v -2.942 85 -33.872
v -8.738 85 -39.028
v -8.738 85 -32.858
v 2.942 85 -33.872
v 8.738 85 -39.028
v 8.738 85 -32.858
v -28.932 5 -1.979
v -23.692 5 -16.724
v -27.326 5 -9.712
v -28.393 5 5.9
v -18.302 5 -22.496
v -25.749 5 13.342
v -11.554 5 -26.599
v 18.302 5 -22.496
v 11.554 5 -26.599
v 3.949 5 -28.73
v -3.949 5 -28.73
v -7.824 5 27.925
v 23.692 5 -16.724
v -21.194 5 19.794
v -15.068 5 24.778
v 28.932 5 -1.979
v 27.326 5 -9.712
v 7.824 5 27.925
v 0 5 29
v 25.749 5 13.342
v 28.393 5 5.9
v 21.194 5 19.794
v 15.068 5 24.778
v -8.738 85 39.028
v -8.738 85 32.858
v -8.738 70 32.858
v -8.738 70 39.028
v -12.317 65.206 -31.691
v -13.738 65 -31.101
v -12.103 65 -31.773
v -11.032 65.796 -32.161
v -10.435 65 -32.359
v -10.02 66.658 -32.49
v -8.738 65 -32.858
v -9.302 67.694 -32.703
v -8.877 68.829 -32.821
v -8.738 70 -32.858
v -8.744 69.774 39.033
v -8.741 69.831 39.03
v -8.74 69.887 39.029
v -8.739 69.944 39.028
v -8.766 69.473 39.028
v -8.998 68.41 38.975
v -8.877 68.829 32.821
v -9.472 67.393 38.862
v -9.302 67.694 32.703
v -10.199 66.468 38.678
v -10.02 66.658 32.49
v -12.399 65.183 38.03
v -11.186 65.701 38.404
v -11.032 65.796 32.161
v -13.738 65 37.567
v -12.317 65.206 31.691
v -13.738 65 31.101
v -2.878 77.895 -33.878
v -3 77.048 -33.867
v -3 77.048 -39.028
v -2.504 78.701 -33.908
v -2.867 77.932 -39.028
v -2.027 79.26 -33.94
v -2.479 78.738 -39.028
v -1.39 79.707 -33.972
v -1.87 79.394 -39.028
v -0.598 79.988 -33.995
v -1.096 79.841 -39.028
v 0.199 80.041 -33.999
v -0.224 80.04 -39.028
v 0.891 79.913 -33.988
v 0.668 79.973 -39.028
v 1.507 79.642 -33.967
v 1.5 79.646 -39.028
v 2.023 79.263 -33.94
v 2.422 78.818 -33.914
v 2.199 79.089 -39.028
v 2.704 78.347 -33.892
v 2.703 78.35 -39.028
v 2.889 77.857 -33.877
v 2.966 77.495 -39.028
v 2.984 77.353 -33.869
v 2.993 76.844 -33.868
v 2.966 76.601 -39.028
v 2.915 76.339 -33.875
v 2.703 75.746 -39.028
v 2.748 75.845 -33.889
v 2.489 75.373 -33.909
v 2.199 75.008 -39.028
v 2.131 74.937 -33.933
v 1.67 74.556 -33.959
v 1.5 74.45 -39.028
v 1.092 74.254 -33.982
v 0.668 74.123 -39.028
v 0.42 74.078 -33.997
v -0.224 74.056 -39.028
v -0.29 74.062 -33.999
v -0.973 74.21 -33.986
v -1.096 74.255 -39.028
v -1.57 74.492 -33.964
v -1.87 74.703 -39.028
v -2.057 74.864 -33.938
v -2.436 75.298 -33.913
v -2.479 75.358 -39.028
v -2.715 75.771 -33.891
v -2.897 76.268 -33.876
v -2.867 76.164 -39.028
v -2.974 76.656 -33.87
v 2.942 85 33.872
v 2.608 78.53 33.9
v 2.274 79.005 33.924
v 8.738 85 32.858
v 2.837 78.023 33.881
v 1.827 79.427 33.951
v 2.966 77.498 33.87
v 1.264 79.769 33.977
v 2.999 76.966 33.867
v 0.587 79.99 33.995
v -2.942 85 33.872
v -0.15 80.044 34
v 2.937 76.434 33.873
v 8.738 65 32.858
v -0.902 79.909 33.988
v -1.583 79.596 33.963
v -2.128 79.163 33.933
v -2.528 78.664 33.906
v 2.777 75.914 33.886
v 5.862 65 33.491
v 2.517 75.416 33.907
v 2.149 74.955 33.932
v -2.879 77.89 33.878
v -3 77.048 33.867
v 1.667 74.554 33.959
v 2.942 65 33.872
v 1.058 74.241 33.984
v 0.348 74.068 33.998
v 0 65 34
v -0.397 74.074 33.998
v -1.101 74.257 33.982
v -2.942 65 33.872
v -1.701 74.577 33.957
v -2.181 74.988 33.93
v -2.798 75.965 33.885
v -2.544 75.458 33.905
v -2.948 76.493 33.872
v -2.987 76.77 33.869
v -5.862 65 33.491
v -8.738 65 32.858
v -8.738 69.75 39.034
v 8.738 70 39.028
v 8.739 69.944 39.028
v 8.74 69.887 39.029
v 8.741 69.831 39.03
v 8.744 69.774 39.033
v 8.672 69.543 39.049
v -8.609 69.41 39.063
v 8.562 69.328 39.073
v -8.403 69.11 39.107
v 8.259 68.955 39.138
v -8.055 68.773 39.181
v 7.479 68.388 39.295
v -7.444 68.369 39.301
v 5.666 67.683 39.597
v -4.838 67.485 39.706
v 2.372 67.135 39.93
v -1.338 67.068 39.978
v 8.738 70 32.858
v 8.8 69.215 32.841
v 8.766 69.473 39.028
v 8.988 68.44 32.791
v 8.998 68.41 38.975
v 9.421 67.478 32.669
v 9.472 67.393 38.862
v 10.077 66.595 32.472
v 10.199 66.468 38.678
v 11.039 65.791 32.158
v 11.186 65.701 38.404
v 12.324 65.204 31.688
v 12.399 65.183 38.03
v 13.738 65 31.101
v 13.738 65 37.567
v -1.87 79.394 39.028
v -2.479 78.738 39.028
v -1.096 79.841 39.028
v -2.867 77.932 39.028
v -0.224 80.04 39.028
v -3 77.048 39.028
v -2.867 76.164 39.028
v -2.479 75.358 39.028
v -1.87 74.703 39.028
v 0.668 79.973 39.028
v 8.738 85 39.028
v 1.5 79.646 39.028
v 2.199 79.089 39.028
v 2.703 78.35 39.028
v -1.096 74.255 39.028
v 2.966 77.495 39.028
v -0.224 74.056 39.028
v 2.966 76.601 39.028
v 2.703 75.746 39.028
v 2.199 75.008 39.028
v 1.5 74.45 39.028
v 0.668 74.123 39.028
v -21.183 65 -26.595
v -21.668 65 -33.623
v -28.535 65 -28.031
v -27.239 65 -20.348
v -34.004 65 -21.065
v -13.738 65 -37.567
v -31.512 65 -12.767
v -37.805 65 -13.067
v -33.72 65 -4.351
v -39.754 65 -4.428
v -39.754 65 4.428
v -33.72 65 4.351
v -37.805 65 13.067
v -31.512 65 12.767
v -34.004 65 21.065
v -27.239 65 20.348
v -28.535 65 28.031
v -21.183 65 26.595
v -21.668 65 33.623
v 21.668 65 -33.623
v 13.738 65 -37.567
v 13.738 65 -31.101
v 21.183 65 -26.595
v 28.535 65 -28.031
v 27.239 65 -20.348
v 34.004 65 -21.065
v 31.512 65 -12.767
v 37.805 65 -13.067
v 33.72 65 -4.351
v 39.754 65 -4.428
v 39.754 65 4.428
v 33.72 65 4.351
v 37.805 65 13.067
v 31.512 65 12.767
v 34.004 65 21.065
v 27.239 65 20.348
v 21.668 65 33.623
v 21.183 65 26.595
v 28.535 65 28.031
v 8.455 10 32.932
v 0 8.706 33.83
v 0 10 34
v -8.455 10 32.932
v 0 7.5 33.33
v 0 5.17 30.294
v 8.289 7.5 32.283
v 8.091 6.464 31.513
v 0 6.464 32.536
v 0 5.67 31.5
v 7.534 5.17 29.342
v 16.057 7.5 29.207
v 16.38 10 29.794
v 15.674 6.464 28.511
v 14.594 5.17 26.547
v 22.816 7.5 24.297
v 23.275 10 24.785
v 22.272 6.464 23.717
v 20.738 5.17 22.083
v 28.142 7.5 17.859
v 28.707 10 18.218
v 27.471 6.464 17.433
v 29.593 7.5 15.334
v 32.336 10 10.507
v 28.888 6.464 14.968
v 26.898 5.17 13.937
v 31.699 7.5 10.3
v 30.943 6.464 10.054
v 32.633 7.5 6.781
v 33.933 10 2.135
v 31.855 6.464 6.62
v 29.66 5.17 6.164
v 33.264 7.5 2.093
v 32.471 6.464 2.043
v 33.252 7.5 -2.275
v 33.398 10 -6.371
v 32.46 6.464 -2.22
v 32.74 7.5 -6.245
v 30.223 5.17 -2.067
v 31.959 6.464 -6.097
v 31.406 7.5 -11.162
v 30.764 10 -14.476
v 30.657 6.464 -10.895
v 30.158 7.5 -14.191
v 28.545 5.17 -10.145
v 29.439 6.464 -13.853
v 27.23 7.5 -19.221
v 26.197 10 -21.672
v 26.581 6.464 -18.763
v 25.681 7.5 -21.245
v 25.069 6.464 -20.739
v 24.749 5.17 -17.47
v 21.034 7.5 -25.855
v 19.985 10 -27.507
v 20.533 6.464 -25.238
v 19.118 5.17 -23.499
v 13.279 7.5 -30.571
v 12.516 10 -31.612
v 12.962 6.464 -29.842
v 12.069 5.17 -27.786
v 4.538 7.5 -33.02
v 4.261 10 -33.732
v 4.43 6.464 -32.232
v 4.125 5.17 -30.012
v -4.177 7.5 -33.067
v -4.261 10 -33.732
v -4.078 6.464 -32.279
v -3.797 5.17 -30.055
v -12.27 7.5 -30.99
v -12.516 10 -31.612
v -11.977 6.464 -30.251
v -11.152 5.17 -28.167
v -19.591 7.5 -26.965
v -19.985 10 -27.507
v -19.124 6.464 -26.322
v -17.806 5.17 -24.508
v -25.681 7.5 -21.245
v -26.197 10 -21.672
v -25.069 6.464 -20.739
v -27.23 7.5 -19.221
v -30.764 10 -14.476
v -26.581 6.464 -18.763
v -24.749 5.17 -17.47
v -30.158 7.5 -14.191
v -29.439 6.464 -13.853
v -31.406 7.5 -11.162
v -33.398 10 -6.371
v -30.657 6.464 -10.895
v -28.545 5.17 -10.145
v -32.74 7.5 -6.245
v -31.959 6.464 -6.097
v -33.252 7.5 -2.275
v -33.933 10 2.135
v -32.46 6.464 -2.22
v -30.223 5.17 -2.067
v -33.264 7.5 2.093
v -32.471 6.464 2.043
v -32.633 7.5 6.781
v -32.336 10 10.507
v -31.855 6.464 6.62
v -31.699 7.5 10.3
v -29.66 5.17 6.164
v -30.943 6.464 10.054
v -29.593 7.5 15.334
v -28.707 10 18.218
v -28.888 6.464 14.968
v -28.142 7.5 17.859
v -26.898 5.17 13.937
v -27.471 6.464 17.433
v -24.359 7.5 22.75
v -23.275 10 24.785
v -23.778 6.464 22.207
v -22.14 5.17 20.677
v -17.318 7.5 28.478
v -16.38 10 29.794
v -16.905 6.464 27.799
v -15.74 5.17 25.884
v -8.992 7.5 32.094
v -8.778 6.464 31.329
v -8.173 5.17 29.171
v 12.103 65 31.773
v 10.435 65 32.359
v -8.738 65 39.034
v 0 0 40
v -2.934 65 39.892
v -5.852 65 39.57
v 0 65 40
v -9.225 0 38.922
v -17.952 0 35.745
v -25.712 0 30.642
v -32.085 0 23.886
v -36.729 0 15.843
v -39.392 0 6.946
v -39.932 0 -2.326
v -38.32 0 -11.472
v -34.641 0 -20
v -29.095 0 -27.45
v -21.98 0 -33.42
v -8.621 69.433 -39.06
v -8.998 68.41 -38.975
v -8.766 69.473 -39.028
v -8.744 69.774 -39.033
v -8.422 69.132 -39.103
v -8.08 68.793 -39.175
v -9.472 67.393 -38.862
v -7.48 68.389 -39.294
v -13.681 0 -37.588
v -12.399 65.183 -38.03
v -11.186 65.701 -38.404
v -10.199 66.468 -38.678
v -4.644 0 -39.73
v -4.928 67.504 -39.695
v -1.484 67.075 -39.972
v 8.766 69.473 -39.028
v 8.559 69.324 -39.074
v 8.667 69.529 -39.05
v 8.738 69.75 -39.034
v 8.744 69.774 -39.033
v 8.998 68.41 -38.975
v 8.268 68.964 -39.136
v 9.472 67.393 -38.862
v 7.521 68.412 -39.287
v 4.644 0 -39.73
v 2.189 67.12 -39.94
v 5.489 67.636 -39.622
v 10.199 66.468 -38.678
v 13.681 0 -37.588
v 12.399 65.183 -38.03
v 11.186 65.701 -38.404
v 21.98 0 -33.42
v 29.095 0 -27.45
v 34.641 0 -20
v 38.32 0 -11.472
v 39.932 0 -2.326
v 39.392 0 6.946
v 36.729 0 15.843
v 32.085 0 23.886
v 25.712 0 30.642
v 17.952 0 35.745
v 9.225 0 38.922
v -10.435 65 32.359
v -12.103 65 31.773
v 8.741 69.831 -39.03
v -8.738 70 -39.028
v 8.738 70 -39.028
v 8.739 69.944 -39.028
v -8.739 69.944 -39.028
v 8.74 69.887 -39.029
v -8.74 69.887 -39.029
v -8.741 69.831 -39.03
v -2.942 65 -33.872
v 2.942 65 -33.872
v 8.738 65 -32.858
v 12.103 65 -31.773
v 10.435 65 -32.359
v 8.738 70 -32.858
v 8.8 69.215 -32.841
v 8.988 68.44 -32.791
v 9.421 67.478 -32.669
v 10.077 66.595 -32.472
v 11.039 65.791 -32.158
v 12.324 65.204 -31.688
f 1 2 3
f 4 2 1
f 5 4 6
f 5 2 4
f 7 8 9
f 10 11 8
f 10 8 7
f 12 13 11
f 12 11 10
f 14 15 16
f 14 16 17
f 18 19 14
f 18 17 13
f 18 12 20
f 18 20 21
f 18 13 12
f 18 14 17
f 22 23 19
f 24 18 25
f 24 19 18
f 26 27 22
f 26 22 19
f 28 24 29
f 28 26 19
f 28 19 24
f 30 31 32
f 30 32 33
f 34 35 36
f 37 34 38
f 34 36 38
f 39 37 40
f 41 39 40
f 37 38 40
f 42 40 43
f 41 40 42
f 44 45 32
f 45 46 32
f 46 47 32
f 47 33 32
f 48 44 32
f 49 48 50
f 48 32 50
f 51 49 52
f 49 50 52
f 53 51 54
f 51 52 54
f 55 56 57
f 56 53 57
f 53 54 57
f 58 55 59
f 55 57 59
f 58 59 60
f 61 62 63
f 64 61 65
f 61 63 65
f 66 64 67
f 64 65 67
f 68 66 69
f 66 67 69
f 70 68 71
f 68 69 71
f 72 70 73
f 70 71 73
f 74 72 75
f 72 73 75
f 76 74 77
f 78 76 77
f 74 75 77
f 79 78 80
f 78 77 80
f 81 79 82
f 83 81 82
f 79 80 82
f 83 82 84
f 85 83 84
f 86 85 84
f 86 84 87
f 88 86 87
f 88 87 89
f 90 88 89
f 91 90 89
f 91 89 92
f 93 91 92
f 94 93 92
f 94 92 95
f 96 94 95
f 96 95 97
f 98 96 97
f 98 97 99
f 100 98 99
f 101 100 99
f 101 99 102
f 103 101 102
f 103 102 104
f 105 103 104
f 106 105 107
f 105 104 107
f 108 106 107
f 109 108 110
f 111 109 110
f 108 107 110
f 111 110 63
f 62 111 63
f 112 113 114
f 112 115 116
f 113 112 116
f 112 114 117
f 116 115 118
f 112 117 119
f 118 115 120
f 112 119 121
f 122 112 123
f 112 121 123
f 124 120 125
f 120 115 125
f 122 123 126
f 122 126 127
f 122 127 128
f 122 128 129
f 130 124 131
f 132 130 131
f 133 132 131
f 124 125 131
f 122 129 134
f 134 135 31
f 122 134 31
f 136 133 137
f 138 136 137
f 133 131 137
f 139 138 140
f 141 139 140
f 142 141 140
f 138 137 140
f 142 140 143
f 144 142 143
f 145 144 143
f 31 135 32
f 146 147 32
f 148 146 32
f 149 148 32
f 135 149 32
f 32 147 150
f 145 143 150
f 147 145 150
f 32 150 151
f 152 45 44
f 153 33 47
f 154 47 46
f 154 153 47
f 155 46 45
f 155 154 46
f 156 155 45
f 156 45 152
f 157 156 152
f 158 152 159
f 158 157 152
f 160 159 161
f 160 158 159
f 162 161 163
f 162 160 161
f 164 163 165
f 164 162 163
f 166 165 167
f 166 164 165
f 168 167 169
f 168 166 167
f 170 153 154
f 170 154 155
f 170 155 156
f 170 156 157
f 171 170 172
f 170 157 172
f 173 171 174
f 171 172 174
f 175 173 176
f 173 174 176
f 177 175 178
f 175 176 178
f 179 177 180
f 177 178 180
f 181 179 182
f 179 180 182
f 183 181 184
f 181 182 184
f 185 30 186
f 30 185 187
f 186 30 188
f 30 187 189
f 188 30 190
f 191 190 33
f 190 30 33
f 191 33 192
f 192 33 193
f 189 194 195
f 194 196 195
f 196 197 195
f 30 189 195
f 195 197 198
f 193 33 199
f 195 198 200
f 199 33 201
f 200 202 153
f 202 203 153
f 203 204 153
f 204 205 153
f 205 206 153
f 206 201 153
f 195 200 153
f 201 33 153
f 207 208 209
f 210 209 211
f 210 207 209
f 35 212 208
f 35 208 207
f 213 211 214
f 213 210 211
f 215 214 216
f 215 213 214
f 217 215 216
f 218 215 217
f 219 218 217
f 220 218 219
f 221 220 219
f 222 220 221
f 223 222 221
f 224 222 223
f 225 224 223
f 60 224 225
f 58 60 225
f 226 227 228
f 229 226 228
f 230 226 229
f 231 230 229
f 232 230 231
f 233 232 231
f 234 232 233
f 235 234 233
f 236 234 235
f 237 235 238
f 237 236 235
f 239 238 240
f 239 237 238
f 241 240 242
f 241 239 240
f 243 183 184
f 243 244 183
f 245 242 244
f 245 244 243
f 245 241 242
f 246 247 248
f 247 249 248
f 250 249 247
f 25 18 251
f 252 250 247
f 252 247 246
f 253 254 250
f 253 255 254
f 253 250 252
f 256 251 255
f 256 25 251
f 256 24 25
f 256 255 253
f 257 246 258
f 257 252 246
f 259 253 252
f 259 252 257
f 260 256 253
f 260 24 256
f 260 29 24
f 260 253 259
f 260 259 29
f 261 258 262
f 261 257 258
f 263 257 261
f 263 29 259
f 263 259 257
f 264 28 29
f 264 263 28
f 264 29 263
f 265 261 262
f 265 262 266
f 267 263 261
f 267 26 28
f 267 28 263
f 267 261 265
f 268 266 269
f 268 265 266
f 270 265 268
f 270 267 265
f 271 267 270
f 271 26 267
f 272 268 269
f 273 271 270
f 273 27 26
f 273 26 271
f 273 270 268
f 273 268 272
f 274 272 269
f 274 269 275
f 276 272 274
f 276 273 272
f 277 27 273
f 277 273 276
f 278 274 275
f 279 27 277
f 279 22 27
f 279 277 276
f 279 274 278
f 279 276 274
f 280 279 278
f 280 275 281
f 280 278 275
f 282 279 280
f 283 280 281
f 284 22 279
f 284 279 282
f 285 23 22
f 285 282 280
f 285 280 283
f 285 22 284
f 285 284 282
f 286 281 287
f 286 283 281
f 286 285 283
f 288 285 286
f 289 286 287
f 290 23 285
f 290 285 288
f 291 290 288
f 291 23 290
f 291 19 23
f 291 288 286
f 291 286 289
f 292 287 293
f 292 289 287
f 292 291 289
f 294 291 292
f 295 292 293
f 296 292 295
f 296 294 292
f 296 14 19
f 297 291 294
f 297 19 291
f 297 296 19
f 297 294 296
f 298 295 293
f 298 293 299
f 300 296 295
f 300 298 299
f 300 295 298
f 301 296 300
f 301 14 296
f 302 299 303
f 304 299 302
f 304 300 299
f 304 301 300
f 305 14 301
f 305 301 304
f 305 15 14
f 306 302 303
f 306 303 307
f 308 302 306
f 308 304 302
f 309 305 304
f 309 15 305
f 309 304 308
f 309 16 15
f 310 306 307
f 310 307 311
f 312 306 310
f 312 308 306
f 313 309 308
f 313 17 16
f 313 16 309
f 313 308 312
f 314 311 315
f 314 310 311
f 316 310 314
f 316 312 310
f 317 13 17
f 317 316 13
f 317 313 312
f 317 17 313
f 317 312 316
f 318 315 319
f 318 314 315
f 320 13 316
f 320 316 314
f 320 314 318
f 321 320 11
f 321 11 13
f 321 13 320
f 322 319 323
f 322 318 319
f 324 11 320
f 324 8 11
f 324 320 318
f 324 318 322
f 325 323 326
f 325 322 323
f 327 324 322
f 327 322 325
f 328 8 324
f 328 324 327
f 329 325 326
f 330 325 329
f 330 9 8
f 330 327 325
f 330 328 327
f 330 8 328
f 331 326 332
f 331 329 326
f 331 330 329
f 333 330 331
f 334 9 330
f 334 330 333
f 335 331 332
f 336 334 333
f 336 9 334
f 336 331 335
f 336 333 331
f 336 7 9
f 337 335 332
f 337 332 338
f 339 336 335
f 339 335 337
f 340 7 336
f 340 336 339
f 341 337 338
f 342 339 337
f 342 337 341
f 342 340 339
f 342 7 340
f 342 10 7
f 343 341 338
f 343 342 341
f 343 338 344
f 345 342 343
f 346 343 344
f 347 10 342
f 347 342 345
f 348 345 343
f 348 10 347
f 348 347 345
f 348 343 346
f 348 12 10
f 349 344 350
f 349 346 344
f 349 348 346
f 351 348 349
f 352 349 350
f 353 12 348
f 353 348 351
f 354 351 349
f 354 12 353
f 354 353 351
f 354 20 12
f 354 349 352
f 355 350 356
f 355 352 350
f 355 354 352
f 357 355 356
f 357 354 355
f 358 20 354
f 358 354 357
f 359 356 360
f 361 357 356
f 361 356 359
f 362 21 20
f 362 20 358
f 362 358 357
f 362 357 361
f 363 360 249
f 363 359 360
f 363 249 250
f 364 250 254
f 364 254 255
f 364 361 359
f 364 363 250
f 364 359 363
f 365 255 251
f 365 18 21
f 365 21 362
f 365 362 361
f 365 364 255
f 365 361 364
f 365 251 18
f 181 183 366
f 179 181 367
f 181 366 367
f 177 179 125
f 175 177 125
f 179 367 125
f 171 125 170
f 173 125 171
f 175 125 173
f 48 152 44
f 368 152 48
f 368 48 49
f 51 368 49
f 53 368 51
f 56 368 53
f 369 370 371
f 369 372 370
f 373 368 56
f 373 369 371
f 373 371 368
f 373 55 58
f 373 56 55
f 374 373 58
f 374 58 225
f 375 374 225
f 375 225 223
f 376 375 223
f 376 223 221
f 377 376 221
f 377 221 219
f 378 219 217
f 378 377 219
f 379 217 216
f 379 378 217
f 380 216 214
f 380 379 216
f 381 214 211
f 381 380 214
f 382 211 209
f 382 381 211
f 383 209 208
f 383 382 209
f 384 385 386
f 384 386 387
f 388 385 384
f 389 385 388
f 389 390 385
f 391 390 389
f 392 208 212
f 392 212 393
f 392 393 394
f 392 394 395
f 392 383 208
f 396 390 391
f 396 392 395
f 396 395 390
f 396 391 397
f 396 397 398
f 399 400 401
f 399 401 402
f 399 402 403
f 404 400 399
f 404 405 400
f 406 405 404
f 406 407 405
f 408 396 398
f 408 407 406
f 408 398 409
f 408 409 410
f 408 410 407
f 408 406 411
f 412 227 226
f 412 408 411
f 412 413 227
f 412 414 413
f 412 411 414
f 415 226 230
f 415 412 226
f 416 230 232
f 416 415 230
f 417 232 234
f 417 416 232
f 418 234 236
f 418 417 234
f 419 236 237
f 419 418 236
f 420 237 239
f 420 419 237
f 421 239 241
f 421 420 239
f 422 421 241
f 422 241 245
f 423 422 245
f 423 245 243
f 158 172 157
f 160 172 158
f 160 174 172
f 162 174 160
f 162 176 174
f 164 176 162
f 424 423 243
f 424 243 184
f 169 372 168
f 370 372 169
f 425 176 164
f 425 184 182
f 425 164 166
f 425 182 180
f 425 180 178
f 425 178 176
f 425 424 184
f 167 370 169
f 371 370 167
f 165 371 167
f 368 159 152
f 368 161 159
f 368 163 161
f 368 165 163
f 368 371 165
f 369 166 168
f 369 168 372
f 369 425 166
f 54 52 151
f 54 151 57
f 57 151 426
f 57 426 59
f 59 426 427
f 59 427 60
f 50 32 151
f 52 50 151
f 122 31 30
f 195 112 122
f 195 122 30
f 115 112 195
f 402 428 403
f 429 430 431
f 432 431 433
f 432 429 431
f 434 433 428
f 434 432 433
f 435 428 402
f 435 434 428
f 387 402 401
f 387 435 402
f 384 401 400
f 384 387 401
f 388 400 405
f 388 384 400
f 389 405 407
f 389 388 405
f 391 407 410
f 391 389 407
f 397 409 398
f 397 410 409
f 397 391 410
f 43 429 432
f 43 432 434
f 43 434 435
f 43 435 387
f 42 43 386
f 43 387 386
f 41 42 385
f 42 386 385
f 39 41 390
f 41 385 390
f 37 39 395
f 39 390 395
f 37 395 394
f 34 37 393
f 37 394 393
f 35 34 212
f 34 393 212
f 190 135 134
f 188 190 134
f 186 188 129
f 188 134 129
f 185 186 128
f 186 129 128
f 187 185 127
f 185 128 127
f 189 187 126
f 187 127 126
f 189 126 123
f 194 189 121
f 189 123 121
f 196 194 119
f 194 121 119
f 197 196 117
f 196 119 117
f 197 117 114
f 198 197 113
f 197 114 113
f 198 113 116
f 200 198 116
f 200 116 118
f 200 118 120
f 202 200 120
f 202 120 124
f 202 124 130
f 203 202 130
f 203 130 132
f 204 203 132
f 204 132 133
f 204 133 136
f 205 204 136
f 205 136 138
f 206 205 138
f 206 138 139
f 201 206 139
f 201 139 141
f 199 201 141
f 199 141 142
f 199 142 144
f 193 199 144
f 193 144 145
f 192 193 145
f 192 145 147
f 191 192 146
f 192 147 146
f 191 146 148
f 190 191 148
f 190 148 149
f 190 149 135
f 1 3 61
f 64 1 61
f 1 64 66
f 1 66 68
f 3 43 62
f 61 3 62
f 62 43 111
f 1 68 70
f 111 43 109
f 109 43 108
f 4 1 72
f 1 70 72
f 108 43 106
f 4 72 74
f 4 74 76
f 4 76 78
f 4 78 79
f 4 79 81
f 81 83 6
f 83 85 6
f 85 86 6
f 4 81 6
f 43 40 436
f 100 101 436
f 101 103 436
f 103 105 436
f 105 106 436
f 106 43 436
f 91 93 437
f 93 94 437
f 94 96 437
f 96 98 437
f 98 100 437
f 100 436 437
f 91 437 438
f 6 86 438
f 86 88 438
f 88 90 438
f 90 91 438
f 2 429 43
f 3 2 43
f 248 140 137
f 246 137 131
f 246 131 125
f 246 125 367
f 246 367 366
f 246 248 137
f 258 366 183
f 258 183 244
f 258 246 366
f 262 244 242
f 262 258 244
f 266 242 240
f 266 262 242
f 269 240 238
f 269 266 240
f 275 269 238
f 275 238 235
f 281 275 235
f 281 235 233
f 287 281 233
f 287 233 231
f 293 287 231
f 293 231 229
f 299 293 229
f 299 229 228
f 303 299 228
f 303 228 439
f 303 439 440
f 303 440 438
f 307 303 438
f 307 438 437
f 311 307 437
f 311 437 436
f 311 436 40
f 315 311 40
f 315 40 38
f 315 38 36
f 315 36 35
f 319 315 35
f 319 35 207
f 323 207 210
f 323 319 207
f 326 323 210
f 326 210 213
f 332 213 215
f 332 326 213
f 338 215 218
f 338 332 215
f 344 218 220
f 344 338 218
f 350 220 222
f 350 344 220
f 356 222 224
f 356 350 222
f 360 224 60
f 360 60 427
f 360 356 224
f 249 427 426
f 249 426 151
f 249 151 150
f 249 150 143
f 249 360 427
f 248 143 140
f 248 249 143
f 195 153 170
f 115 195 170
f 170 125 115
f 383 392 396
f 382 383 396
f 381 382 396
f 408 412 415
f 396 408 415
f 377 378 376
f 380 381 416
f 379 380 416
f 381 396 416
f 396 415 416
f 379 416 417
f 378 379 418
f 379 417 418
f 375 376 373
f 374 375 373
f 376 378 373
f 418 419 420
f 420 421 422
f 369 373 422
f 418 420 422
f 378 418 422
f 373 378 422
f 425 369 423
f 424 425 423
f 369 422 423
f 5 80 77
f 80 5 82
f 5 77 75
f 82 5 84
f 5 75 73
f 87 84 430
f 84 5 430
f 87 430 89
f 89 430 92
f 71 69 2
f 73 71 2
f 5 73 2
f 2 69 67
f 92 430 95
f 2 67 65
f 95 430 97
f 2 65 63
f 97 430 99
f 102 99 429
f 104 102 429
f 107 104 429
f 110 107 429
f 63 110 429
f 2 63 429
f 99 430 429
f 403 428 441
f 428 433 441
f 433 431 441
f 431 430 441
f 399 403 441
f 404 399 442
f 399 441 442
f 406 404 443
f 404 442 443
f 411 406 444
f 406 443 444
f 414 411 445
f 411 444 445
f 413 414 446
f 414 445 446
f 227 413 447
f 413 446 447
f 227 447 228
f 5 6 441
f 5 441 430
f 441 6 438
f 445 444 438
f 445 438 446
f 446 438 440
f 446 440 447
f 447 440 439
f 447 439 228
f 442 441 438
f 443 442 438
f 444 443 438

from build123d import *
from build123d.topology import SkipClean

# Parameters (mm, degrees)
SKETCH1_R           = 40
BOSS_EXTRUDE1_DEPTH = 5
SKETCH2_R           = 40
SKETCH2_R_2         = 34
BOSS_EXTRUDE2_DEPTH = 60
BOSS_EXTRUDE3_DEPTH = 20
FILLET1_R           = 5
SKETCH4_R           = 3
CUT_EXTRUDE1_DEPTH  = 95
FILLET2_R           = 5
FILLET3_R           = 5


with BuildPart() as part:
    # Sketch1 → Boss-Extrude1 (new body)
    with BuildSketch(Plane(origin=(0, 0, 0), x_dir=(1, 0, 0), z_dir=(0, 1, 0))):
        with Locations(Location((0, 0, 0), (0, 0, 270))):
            Circle(SKETCH1_R)
    extrude(amount=BOSS_EXTRUDE1_DEPTH)

    # Sketch2 → Boss-Extrude2 (add)
    with BuildSketch(Plane(origin=(0, 5, 0), x_dir=(1, 0, 0), z_dir=(0, 1, 0))):
        with Locations(Location((0, 0, 0), (0, 0, 270))):
            Circle(SKETCH2_R)
        with Locations(Location((0, 0, 0), (0, 0, 270))):
            Circle(SKETCH2_R_2, mode=Mode.SUBTRACT)
    extrude(amount=BOSS_EXTRUDE2_DEPTH)

    # Sketch3 → Boss-Extrude3 (add)
    with SkipClean():  # the faces are left unmerged after this step: merging them gives an invalid solid
        with BuildSketch(Plane(origin=(0, 65, 0), x_dir=(1, 0, 0), z_dir=(0, 1, 0))):
            with BuildLine():
                ThreePointArc((8.738415, -32.857877), (0, -34), (-8.738415, -32.857877))
                Line((-8.738415, -32.857877), (-8.738415, -39.027584))
                Line((-8.738415, -39.027584), (8.738415, -39.027584))
                Line((8.738415, -39.027584), (8.738415, -32.857877))
            make_face()
            with BuildLine():
                Line((8.738415, 39.027584), (-8.738415, 39.027584))
                Line((-8.738415, 39.027584), (-8.738415, 32.857877))
                ThreePointArc((-8.738415, 32.857877), (0, 34), (8.738415, 32.857877))
                Line((8.738415, 32.857877), (8.738415, 39.027584))
            make_face()
        extrude(amount=BOSS_EXTRUDE3_DEPTH)

    # Fillet1
    # the kernel refuses this fillet: 5 mm, written as the material it adds along each edge
    with BuildSketch(Plane(origin=(8.738415, 65, 39.027584), x_dir=(1, 0, 0), z_dir=(0, 0, -1))) as fillet1_piece_1_section:
        with BuildLine():
            CenterArc((FILLET1_R, -FILLET1_R), FILLET1_R, 90, 90)
            Line((0, -FILLET1_R), (0, 0))
            Line((0, 0), (FILLET1_R, 0))
        make_face()
    fillet1_piece_1 = extrude(amount=18.669707, mode=Mode.PRIVATE)
    fillet1_piece_1 = fillet1_piece_1 & Plane(origin=(0, 66.126044, 0), x_dir=(0, 0, 1), z_dir=(0, -1, 0)) * Cylinder(40, 58, mode=Mode.PRIVATE)
    fillet1_piece_1 = fillet1_piece_1 - Plane(origin=(0, 66.126044, 0), x_dir=(0, 0, 1), z_dir=(0, -1, 0)) * Cylinder(34, 58, mode=Mode.PRIVATE)
    add(fillet1_piece_1)
    with BuildSketch(Plane(origin=(-8.738415, 65, 20.357877), x_dir=(-1, 0, 0), z_dir=(0, 0, 1))) as fillet1_piece_2_section:
        with BuildLine():
            CenterArc((FILLET1_R, -FILLET1_R), FILLET1_R, 90, 90)
            Line((0, -FILLET1_R), (0, 0))
            Line((0, 0), (FILLET1_R, 0))
        make_face()
    fillet1_piece_2 = extrude(amount=18.669707, mode=Mode.PRIVATE)
    fillet1_piece_2 = fillet1_piece_2 & Plane(origin=(0, 66.126045, 0), x_dir=(0, 0, 1), z_dir=(0, -1, 0)) * Cylinder(40, 58, mode=Mode.PRIVATE)
    fillet1_piece_2 = fillet1_piece_2 - Plane(origin=(0, 66.126045, 0), x_dir=(0, 0, 1), z_dir=(0, -1, 0)) * Cylinder(34, 58, mode=Mode.PRIVATE)
    add(fillet1_piece_2)
    with BuildSketch(Plane(origin=(-8.738415, 65, -39.027584), x_dir=(-1, 0, 0), z_dir=(0, 0, 1))) as fillet1_piece_3_section:
        with BuildLine():
            CenterArc((FILLET1_R, -FILLET1_R), FILLET1_R, 90, 90)
            Line((0, -FILLET1_R), (0, 0))
            Line((0, 0), (FILLET1_R, 0))
        make_face()
    fillet1_piece_3 = extrude(amount=18.669707, mode=Mode.PRIVATE)
    fillet1_piece_3 = fillet1_piece_3 & Plane(origin=(0, 66.126044, 0), x_dir=(0, 0, 1), z_dir=(0, -1, 0)) * Cylinder(40, 58, mode=Mode.PRIVATE)
    fillet1_piece_3 = fillet1_piece_3 - Plane(origin=(0, 66.126044, 0), x_dir=(0, 0, 1), z_dir=(0, -1, 0)) * Cylinder(34, 58, mode=Mode.PRIVATE)
    add(fillet1_piece_3)
    with BuildSketch(Plane(origin=(8.738415, 65, -20.357877), x_dir=(1, 0, 0), z_dir=(0, 0, -1))) as fillet1_piece_4_section:
        with BuildLine():
            CenterArc((FILLET1_R, -FILLET1_R), FILLET1_R, 90, 90)
            Line((0, -FILLET1_R), (0, 0))
            Line((0, 0), (FILLET1_R, 0))
        make_face()
    fillet1_piece_4 = extrude(amount=18.669707, mode=Mode.PRIVATE)
    fillet1_piece_4 = fillet1_piece_4 & Plane(origin=(0, 66.126045, 0), x_dir=(0, 0, 1), z_dir=(0, -1, 0)) * Cylinder(40, 58, mode=Mode.PRIVATE)
    fillet1_piece_4 = fillet1_piece_4 - Plane(origin=(0, 66.126045, 0), x_dir=(0, 0, 1), z_dir=(0, -1, 0)) * Cylinder(34, 58, mode=Mode.PRIVATE)
    add(fillet1_piece_4)

    # Sketch4 → Cut-Extrude1 (cut)
    with BuildSketch(Plane(origin=(0, 0, -39.027584), x_dir=(-1, 0, 0), z_dir=(0, 0, -1))):
        with Locations((0, 77.048027)):
            Circle(SKETCH4_R)
    extrude(amount=-CUT_EXTRUDE1_DEPTH, mode=Mode.SUBTRACT)

    # Fillet2
    fillet2_edges = [part.edges().sort_by_distance(p)[0] for p in [
        (0, 5, -34),
    ]]
    fillet(fillet2_edges, radius=FILLET2_R)

    # Fillet3
    # the kernel refuses this fillet: 5 mm, written as the material it adds along each edge
    with BuildSketch(Plane(origin=(-8.738415, 65, 39.027584), x_dir=(0, 1, 0), z_dir=(1, 0, 0))) as fillet3_piece_1_section:
        with BuildLine():
            CenterArc((FILLET3_R, FILLET3_R), FILLET3_R, 180, 90)
            Line((0, FILLET3_R), (0, 0))
            Line((0, 0), (FILLET3_R, 0))
        make_face()
    fillet3_piece_1 = extrude(amount=30.004694, mode=Mode.PRIVATE)
    fillet3_piece_1 = fillet3_piece_1 & Plane(origin=(0, 66.676029, 0), x_dir=(0, 0, 1), z_dir=(0, -1, 0)) * Cylinder(40, 81, mode=Mode.PRIVATE)
    fillet3_piece_1 = fillet3_piece_1 - Plane(origin=(13.738415, 70, 39.364377), x_dir=(1, 0, 0), z_dir=(0, 0, 1)) * Cylinder(5, 81, mode=Mode.PRIVATE)
    add(fillet3_piece_1)
    with BuildSketch(Plane(origin=(8.738415, 65, -39.027584), x_dir=(0, 1, 0), z_dir=(-1, 0, 0))) as fillet3_piece_2_section:
        with BuildLine():
            CenterArc((FILLET3_R, FILLET3_R), FILLET3_R, 180, 90)
            Line((0, FILLET3_R), (0, 0))
            Line((0, 0), (FILLET3_R, 0))
        make_face()
    fillet3_piece_2 = extrude(amount=30.004694, mode=Mode.PRIVATE)
    fillet3_piece_2 = fillet3_piece_2 - Plane(origin=(-13.738415, 70, -39.364375), x_dir=(-1, 0, 0), z_dir=(0, 0, -1)) * Cylinder(5, 81, mode=Mode.PRIVATE)
    fillet3_piece_2 = fillet3_piece_2 & Plane(origin=(0, 66.676016, 0), x_dir=(0, 0, 1), z_dir=(0, -1, 0)) * Cylinder(40, 81, mode=Mode.PRIVATE)
    add(fillet3_piece_2)
    with BuildSketch(Plane(origin=(8.738415, 65, -39.027584), x_dir=(0, 0, -1), z_dir=(1, 0, 0))) as fillet3_piece_3_section:
        with BuildLine():
            CenterArc((FILLET3_R, FILLET3_R), FILLET3_R, 180, 90)
            Line((0, FILLET3_R), (0, 0))
            Line((0, 0), (FILLET3_R, 0))
        make_face()
    fillet3_piece_3 = extrude(amount=12.527864, mode=Mode.PRIVATE)
    fillet3_piece_3 = fillet3_piece_3 & Plane(origin=(0, 67.353955, 0), x_dir=(0, 0, 1), z_dir=(0, -1, 0)) * Cylinder(40, 46, mode=Mode.PRIVATE)
    fillet3_piece_3 = fillet3_piece_3 - Plane(origin=(13.738415, 70, -39.02968), x_dir=(1, 0, 0), z_dir=(0, 0, 1)) * Cylinder(5, 46, mode=Mode.PRIVATE)
    add(fillet3_piece_3)
    with BuildSketch(Plane(origin=(-8.738415, 65, 39.027584), x_dir=(0, 1, 0), z_dir=(-1, 0, 0))) as fillet3_piece_4_section:
        with BuildLine():
            CenterArc((FILLET3_R, -FILLET3_R), FILLET3_R, 90, 90)
            Line((0, -FILLET3_R), (0, 0))
            Line((0, 0), (FILLET3_R, 0))
        make_face()
    fillet3_piece_4 = extrude(amount=12.527864, mode=Mode.PRIVATE)
    fillet3_piece_4 = fillet3_piece_4 - Plane(origin=(-13.738415, 70, 39.02968), x_dir=(-1, 0, 0), z_dir=(0, 0, -1)) * Cylinder(5, 46, mode=Mode.PRIVATE)
    fillet3_piece_4 = fillet3_piece_4 & Plane(origin=(0, 67.353955, 0), x_dir=(0, 0, 1), z_dir=(0, -1, 0)) * Cylinder(40, 46, mode=Mode.PRIVATE)
    add(fillet3_piece_4)


solid = part.part
